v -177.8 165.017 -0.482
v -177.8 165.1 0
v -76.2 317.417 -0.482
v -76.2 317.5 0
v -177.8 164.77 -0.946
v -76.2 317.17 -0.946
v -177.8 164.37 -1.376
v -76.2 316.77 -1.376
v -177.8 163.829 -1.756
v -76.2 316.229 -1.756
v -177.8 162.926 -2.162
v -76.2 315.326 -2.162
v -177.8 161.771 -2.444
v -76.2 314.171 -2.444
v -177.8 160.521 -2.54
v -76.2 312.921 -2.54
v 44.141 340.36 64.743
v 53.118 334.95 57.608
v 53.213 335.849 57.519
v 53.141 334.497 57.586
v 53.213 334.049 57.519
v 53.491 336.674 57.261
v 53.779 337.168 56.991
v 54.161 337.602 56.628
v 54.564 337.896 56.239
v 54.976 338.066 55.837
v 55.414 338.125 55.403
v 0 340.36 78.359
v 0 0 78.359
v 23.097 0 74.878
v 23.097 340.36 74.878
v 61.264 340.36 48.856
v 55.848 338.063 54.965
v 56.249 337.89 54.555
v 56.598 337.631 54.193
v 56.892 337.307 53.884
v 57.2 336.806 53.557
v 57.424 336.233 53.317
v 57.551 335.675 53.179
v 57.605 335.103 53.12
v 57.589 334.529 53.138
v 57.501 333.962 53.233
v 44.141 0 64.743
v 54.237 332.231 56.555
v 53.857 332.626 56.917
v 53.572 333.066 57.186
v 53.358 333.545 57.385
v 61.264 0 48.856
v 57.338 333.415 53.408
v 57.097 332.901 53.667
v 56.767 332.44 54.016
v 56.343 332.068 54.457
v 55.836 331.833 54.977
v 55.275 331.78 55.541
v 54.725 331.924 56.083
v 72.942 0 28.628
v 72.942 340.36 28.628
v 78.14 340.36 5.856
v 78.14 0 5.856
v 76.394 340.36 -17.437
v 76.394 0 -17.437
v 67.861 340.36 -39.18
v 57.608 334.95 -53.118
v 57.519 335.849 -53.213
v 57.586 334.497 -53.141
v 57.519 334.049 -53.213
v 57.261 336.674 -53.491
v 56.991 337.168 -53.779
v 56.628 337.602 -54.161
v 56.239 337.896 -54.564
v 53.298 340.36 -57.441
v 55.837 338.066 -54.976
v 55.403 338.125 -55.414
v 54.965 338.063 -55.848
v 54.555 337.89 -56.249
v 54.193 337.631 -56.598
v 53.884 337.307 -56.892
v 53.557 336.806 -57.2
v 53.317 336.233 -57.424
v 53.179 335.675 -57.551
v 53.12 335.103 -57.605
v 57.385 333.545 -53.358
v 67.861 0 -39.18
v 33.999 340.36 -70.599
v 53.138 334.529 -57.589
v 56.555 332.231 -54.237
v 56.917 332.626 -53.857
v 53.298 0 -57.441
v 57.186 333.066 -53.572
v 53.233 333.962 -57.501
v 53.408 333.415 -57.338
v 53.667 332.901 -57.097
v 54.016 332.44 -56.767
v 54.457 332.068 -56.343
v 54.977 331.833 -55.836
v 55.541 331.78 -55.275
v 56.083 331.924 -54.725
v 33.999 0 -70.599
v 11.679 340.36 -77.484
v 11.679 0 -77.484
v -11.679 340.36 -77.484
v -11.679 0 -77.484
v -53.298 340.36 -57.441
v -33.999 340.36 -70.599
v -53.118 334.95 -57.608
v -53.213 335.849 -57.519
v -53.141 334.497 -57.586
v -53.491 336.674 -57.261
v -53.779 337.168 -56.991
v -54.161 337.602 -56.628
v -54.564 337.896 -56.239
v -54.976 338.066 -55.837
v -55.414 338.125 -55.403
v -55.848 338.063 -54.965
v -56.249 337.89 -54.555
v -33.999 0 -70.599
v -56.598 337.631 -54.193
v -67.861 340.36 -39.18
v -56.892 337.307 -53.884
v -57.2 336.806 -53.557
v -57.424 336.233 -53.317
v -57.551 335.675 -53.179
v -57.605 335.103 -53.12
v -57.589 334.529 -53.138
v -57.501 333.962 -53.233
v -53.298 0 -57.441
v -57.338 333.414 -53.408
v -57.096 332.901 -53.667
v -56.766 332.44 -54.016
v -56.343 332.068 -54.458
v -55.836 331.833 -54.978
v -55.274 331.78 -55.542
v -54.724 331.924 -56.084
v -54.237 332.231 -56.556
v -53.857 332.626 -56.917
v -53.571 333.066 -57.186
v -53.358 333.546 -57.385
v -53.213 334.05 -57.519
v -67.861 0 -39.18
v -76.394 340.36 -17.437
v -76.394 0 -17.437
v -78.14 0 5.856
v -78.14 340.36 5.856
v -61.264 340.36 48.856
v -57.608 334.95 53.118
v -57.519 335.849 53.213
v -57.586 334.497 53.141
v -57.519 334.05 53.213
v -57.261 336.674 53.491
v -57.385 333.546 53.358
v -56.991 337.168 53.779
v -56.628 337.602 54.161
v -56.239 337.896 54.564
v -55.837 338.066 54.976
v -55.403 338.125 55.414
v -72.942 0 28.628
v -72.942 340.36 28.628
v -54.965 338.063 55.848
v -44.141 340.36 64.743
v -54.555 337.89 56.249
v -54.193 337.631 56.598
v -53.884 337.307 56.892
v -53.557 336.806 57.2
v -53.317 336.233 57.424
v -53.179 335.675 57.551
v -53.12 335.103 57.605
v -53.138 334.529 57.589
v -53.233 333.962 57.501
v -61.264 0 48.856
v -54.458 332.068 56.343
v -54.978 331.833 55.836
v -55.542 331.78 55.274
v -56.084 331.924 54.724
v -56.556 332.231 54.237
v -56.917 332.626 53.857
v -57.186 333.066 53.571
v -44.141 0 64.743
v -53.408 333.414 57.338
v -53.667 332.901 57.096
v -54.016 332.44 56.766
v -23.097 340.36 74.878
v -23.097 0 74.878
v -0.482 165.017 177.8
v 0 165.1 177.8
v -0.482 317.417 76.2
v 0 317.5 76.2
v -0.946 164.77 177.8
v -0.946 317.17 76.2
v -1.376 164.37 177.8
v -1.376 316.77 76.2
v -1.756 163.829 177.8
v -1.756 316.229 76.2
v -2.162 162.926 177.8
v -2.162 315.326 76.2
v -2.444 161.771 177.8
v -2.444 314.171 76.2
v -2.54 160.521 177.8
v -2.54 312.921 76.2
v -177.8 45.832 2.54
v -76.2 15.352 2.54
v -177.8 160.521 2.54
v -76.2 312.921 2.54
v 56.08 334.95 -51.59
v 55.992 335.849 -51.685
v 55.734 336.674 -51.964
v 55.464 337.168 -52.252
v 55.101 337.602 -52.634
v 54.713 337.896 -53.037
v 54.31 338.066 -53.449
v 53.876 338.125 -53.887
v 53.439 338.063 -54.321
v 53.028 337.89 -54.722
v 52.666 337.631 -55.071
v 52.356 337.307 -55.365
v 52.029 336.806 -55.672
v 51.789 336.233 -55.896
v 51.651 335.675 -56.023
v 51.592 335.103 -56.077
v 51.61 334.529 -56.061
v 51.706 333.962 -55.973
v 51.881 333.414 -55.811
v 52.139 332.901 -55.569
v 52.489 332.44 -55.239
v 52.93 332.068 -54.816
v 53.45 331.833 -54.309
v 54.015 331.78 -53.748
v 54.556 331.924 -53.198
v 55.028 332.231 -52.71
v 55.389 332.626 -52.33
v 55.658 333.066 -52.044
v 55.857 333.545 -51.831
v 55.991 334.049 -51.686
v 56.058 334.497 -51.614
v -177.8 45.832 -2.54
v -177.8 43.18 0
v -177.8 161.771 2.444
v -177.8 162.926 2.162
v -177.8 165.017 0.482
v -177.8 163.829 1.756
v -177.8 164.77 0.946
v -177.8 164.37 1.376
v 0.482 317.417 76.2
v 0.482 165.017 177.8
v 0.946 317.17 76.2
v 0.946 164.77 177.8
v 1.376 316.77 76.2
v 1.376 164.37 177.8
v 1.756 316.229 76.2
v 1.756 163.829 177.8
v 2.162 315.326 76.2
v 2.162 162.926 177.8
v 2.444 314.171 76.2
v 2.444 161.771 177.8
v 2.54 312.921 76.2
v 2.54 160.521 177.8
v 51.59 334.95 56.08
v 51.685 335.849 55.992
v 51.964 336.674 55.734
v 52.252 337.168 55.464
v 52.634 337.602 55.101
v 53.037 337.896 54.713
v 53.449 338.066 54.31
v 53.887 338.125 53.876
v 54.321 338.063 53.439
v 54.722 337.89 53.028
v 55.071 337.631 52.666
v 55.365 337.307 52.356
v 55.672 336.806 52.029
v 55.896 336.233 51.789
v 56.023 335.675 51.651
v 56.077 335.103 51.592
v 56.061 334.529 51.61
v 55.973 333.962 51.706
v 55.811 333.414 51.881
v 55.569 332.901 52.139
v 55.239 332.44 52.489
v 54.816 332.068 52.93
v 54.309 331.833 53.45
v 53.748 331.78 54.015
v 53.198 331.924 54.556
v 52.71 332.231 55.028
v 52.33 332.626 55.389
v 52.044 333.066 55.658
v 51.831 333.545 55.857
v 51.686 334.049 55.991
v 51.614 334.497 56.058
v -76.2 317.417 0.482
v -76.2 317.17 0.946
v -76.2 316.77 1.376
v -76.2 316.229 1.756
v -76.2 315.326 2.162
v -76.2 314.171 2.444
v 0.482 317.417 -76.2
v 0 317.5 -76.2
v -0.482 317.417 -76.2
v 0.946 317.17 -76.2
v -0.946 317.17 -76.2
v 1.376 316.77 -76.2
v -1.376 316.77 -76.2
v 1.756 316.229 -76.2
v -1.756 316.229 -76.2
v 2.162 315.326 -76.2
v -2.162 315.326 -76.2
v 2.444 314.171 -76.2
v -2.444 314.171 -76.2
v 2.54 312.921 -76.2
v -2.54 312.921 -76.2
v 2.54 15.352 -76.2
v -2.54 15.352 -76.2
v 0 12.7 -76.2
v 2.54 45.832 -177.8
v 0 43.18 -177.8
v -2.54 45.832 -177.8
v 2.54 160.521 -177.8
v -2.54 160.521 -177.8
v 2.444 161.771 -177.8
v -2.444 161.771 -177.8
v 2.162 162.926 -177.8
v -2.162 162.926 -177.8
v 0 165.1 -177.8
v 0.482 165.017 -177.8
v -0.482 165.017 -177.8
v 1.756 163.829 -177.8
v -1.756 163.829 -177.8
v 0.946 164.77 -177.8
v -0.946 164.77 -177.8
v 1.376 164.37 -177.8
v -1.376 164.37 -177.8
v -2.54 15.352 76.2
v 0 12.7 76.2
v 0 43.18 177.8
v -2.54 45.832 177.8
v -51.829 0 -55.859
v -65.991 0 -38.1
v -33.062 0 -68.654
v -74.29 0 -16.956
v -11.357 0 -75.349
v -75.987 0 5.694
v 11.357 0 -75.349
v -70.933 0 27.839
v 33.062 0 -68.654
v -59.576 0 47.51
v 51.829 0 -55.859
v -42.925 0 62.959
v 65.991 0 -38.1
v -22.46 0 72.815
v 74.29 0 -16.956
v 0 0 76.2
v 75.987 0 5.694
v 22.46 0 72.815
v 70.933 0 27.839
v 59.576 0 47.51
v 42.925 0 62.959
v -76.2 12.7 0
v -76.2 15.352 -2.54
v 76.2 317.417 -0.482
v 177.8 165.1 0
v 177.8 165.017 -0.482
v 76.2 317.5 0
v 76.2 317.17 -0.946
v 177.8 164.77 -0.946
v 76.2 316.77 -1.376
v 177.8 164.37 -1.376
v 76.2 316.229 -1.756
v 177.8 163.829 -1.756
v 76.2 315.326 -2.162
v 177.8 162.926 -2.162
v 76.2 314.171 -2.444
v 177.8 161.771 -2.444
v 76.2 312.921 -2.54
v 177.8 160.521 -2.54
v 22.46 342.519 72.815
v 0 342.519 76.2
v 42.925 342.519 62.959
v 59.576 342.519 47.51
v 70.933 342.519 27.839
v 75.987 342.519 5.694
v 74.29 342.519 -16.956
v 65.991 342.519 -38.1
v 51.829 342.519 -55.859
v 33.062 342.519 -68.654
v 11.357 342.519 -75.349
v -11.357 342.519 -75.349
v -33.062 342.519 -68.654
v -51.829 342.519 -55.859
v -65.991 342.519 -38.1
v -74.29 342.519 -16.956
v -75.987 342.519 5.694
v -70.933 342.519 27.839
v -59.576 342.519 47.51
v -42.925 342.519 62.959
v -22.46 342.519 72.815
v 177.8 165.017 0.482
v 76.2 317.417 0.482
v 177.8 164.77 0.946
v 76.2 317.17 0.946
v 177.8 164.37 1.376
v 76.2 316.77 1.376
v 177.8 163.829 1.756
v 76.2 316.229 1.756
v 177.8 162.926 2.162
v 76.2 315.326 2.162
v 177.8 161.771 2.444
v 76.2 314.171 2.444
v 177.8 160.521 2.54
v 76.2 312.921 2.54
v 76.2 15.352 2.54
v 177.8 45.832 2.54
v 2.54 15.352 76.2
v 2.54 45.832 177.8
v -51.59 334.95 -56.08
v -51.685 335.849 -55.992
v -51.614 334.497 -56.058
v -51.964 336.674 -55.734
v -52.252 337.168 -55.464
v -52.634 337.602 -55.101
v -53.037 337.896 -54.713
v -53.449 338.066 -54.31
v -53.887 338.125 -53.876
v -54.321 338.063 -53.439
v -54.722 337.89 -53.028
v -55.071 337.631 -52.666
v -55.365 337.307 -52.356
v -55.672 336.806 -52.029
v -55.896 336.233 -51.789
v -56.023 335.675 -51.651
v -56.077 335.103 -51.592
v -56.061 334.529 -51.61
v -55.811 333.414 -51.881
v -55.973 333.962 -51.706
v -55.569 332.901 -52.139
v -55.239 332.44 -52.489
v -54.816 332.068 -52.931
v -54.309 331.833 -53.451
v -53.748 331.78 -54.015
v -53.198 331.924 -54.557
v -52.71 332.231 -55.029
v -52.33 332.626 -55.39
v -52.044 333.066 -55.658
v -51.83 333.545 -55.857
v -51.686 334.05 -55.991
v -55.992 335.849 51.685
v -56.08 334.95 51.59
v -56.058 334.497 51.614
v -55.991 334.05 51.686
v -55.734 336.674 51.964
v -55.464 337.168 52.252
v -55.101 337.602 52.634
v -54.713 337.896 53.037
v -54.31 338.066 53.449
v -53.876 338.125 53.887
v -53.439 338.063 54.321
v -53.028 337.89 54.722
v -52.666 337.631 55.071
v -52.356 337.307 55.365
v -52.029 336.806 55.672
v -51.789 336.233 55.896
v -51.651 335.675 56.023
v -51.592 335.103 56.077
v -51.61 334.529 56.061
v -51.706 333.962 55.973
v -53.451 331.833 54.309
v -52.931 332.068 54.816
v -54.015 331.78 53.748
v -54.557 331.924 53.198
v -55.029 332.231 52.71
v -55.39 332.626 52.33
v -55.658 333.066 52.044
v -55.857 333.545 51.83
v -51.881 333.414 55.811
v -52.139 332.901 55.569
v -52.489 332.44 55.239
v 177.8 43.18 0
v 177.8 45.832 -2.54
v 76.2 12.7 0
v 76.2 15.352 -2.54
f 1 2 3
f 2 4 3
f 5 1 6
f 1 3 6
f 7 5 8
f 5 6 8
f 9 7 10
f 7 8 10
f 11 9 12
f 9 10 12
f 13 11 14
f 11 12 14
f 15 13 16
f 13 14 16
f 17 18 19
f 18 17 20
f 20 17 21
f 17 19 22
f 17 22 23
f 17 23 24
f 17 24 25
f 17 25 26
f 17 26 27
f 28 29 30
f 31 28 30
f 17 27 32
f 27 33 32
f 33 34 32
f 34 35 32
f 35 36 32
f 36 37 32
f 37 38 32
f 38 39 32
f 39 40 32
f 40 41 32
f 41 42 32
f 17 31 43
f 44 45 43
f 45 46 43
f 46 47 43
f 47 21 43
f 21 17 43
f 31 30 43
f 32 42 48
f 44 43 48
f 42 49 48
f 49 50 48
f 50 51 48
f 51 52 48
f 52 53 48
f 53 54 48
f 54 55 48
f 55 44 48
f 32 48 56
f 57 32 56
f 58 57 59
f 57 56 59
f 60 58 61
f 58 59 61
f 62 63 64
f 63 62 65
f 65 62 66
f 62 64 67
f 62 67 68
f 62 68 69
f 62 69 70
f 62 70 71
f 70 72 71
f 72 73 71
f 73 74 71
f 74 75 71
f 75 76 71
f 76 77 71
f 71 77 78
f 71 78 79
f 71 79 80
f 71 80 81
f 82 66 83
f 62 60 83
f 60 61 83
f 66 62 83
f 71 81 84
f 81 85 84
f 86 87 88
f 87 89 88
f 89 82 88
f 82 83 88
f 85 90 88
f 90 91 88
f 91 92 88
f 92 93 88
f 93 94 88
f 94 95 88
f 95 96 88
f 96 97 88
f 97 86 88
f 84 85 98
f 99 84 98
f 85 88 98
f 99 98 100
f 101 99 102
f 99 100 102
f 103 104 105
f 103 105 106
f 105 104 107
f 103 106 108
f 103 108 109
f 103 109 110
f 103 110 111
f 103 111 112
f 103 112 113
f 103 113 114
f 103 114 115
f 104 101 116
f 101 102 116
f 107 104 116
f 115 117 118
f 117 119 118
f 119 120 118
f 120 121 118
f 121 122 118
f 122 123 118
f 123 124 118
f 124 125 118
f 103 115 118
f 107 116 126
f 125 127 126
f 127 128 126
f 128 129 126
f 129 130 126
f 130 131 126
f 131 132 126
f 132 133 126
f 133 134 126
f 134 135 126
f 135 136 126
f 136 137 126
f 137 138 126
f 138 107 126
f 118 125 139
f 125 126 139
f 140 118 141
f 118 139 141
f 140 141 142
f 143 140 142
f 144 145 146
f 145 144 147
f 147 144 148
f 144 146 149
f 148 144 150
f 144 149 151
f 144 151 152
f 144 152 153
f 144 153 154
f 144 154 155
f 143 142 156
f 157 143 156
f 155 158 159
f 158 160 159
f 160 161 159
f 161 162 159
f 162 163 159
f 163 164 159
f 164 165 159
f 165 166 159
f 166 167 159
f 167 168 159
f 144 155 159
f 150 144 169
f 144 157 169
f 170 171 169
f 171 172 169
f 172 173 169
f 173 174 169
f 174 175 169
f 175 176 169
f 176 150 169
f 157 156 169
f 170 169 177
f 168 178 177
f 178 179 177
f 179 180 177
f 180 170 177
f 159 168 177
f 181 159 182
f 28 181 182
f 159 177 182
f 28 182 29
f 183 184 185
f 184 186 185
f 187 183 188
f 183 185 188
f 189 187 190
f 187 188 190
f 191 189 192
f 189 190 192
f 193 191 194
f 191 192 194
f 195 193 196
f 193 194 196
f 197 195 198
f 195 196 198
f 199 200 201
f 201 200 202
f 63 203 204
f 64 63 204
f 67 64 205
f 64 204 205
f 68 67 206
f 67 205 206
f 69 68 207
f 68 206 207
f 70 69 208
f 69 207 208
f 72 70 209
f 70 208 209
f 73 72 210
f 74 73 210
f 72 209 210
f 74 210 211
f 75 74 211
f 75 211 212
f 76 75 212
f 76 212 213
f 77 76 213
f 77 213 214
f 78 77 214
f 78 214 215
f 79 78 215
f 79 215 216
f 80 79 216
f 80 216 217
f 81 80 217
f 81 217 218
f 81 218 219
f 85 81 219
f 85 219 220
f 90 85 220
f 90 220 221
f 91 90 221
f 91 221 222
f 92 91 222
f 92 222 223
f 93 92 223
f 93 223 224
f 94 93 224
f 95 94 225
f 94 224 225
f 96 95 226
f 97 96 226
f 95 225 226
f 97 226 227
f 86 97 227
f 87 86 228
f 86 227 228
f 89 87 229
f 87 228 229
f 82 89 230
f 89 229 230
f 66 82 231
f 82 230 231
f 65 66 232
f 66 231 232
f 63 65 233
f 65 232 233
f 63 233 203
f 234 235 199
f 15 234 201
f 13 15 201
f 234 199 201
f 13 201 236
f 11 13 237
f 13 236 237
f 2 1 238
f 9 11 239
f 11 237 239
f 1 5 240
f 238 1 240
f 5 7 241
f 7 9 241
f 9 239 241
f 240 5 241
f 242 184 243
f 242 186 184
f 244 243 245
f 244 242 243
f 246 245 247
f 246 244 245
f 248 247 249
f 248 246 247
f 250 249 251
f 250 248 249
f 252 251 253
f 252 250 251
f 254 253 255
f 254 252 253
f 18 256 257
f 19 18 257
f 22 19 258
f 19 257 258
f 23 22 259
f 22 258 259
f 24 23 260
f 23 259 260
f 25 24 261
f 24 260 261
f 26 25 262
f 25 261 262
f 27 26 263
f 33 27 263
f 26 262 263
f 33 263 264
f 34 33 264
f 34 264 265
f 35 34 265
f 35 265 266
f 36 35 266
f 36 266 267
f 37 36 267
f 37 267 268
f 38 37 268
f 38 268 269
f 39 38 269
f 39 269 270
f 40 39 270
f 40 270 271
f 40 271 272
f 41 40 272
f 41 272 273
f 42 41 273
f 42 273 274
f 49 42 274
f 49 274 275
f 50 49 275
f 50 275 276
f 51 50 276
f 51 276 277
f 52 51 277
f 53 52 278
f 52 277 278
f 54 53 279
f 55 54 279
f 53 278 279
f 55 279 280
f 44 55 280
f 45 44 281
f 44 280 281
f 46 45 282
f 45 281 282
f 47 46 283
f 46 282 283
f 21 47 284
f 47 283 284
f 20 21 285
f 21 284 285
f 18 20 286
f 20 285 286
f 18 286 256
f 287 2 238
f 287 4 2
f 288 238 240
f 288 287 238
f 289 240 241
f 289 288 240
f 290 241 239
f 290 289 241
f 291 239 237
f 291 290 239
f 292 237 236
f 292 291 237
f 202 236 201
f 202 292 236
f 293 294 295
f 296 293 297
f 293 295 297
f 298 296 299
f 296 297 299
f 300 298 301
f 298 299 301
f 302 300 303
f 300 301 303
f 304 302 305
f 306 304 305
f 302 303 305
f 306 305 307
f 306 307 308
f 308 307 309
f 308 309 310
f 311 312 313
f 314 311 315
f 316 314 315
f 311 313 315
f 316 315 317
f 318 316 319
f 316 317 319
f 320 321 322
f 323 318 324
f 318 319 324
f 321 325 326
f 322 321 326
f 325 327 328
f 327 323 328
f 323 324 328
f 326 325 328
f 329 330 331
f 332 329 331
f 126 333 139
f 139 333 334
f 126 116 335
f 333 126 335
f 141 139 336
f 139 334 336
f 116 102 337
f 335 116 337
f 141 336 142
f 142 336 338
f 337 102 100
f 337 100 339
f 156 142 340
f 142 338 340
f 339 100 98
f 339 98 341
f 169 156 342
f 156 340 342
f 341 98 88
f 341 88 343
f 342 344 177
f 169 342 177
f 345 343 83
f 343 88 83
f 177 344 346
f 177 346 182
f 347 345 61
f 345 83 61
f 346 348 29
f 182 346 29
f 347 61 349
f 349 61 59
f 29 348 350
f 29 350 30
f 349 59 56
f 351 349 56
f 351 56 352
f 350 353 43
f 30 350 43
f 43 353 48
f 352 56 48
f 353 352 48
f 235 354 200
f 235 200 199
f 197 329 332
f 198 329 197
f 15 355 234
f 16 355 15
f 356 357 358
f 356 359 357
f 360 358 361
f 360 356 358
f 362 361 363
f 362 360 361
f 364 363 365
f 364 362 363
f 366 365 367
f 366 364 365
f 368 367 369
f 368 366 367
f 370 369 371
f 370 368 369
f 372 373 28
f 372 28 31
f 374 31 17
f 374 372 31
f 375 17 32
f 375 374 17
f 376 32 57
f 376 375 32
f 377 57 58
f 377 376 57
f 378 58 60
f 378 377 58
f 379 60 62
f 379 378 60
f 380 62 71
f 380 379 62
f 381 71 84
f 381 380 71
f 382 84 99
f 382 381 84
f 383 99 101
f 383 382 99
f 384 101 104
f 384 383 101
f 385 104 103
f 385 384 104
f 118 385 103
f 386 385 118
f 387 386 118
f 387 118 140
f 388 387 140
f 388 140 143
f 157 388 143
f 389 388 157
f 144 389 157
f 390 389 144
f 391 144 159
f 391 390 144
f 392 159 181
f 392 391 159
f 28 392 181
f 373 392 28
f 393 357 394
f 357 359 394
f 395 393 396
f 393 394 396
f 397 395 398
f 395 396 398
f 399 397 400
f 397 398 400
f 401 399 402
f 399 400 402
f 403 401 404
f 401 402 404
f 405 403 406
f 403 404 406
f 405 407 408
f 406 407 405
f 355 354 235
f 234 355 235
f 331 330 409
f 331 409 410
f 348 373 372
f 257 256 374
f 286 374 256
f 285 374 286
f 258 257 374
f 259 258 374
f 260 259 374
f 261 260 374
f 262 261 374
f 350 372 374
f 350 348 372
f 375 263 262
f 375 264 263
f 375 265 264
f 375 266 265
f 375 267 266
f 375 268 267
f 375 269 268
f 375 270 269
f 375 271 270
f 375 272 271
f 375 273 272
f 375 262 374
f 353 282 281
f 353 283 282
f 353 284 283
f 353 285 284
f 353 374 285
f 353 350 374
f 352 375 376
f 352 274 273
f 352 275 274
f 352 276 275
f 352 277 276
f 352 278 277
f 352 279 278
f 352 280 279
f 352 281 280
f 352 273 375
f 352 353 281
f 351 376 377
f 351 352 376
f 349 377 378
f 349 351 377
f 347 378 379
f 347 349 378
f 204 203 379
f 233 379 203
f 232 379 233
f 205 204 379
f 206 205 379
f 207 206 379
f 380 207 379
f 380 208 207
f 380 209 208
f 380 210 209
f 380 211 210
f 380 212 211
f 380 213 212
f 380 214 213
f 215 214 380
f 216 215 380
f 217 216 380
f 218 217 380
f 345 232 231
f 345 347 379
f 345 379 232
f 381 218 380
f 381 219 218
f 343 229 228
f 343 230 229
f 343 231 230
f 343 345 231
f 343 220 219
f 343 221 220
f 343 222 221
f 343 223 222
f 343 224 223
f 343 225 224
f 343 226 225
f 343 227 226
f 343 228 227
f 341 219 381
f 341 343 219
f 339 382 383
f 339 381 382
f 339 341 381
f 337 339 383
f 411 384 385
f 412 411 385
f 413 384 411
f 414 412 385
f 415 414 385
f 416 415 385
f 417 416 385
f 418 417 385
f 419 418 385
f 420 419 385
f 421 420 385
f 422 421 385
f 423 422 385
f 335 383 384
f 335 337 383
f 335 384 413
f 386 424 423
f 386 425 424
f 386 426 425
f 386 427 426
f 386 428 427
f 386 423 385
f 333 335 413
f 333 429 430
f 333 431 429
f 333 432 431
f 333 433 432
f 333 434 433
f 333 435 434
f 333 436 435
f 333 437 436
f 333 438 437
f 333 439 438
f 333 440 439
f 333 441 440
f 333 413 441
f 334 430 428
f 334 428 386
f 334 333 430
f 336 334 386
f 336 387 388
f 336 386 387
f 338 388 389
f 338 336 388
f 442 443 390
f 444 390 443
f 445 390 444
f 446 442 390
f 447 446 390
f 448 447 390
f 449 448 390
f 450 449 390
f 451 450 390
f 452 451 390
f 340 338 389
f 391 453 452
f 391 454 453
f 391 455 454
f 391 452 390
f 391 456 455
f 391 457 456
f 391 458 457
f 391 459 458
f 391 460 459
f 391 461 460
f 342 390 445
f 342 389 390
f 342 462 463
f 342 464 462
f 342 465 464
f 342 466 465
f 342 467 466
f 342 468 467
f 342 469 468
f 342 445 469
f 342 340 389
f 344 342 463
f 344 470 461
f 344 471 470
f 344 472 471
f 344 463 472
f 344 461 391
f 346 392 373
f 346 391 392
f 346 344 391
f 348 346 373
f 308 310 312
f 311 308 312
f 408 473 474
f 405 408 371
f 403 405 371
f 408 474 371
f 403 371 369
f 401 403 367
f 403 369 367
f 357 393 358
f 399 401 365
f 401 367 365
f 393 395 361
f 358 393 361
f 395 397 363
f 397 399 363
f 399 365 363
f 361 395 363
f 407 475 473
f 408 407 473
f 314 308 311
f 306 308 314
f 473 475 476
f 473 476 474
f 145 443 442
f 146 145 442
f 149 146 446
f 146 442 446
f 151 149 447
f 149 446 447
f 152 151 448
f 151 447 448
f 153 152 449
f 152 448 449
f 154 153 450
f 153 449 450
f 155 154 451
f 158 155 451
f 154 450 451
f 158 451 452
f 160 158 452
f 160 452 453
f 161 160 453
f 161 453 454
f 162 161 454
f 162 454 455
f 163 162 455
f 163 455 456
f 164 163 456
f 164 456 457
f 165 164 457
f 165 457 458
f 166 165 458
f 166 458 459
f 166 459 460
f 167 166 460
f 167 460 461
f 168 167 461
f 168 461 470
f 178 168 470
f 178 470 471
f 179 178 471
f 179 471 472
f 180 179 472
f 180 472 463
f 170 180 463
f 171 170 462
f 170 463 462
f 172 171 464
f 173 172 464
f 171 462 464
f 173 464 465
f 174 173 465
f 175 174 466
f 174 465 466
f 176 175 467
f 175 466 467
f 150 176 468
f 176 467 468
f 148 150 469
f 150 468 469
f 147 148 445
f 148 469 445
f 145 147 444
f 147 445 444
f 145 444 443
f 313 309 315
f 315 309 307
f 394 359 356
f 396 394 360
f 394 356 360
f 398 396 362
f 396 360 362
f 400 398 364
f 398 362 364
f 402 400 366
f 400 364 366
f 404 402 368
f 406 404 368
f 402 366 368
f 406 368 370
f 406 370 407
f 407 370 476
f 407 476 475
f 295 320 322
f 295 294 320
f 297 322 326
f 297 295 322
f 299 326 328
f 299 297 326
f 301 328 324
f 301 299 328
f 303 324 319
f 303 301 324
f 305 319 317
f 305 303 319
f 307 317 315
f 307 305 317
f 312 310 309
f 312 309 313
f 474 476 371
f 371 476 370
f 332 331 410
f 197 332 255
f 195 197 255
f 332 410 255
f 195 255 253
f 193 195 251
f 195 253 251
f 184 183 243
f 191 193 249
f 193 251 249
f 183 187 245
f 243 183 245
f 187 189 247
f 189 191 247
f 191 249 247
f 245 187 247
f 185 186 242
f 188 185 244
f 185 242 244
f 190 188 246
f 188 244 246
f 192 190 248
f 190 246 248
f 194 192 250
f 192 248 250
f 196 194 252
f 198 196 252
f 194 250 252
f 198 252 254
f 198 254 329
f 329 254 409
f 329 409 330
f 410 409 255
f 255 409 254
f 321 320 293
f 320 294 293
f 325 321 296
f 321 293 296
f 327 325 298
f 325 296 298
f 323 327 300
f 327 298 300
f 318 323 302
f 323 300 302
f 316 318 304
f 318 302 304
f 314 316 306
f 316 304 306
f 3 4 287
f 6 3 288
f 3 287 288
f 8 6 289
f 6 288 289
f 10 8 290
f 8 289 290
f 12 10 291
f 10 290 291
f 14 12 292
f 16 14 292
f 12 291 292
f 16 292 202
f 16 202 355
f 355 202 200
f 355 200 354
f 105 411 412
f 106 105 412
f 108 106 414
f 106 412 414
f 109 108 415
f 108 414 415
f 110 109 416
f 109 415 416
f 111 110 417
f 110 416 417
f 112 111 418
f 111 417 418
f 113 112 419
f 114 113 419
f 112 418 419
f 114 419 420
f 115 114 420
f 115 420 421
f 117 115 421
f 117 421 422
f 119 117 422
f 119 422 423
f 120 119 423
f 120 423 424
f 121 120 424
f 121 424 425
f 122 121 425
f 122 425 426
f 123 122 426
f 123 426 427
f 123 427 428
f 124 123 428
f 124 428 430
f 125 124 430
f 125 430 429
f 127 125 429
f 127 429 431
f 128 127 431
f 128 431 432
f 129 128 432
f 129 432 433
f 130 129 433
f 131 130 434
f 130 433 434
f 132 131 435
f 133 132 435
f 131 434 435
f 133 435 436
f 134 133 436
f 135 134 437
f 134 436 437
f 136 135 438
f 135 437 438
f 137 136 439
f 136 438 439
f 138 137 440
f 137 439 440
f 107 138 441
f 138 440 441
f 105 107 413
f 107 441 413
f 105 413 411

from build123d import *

# Parameters (mm, degrees)
SKETCH1_R                = 78.359
SKETCH1_R_2              = 76.2
BOSS_EXTRUDE1_DEPTH      = 342.9
BOSS_EXTRUDE2_DEPTH      = 2.54
BOSS_EXTRUDE2_DEPTH_BACK = 2.54
FILLET2_R                = 2.54
CHAMFER2_SIZE            = 2.54
CIRPATTERN1_COUNT        = 4
SKETCH4_R                = 3.175
CUT_EXTRUDE1_DEPTH       = 426.212993687
CIRPATTERN2_COUNT        = 4
CHAMFER3_SIZE            = 2.54


# Some blends are built 0.0001 mm under size
with BuildPart() as part:
    # Sketch1 → Boss-Extrude1 (new body)
    with BuildSketch(Plane(origin=(0, 0, 0), x_dir=(1, 0, 0), z_dir=(0, 1, 0))):
        with Locations(Location((0, 0, 0), (0, 0, 270))):
            Circle(SKETCH1_R)
        with Locations(Location((0, 0, 0), (0, 0, 270))):
            Circle(SKETCH1_R_2, mode=Mode.SUBTRACT)
    extrude(amount=BOSS_EXTRUDE1_DEPTH)

    # Sketch4 → Cut-Extrude1 (cut, through all)
    with BuildSketch(Plane(origin=(0, 0, 0), x_dir=(-0.7071067811865462, 0, 0.7071067811865489), z_dir=(-0.7071067811865489, 0, -0.7071067811865462))):
        with Locations((0, 334.9498)):
            Circle(SKETCH4_R)
    cut_extrude1 = extrude(amount=-CUT_EXTRUDE1_DEPTH, mode=Mode.SUBTRACT)

    # CirPattern2: Cut-Extrude1 ×4 about axis
    cirpattern2_axis = Axis((0, -69.284011973, 0), (0, 1, 0))
    for i in range(1, CIRPATTERN2_COUNT):
        add(cut_extrude1.rotate(cirpattern2_axis, i * 360 / CIRPATTERN2_COUNT), mode=Mode.SUBTRACT)

    # Chamfer3
    # the kernel refuses this chamfer: 2.54 mm, written as the material it takes off along each edge
    with BuildSketch(Plane(origin=(0, 342.9, 0), x_dir=(0, 0, 1), z_dir=(-1, 0, 0))) as chamfer3_piece_1:
        Polygon((78.359, -CHAMFER3_SIZE), (78.359 - CHAMFER3_SIZE, 0), (78.359, 0), align=None)
    revolve(axis=Axis((0, 342.9, 0), (0, 1, 0)), mode=Mode.SUBTRACT)


with BuildPart() as body_2:
    # Sketch2 → Boss-Extrude2 (new, two sides: drawn at the far end of the back side and taken through both)
    with BuildSketch(Plane.XY.offset(-BOSS_EXTRUDE2_DEPTH_BACK)):
        Polygon((76.2, 317.5), (76.2, 12.7), (177.8, 43.18), (177.8, 165.1), align=None)
    extrude(amount=BOSS_EXTRUDE2_DEPTH + BOSS_EXTRUDE2_DEPTH_BACK)

    # Fillet2
    fillet2_edges = [body_2.edges().sort_by_distance(p)[0] for p in [
        (127, 241.3, -2.54),
        (127, 241.3, 2.54),
    ]]
    fillet(fillet2_edges, radius=FILLET2_R - 0.0001)  # a hair under: the kernel refuses the full size

    # Chamfer2
    chamfer2_edges = [body_2.edges().sort_by_distance(p)[0] for p in [
        (127, 27.94, -2.54),
        (127, 27.94, 2.54),
    ]]
    chamfer(chamfer2_edges, length=CHAMFER2_SIZE - 0.0001)  # a hair under: the kernel refuses the full size


with BuildPart() as cirpattern1_1:
    # CirPattern1: pattern copy
    add(body_2.part.rotate(Axis((0, 0, 0), (0, 1, 0)), 1 * 360 / CIRPATTERN1_COUNT))


with BuildPart() as cirpattern1_2:
    # CirPattern1: pattern copy
    add(body_2.part.rotate(Axis((0, 0, 0), (0, 1, 0)), 2 * 360 / CIRPATTERN1_COUNT))


with BuildPart() as cirpattern1_3:
    # CirPattern1: pattern copy
    add(body_2.part.rotate(Axis((0, 0, 0), (0, 1, 0)), 3 * 360 / CIRPATTERN1_COUNT))


solid = Compound([part.part, body_2.part, cirpattern1_1.part, cirpattern1_2.part, cirpattern1_3.part])
